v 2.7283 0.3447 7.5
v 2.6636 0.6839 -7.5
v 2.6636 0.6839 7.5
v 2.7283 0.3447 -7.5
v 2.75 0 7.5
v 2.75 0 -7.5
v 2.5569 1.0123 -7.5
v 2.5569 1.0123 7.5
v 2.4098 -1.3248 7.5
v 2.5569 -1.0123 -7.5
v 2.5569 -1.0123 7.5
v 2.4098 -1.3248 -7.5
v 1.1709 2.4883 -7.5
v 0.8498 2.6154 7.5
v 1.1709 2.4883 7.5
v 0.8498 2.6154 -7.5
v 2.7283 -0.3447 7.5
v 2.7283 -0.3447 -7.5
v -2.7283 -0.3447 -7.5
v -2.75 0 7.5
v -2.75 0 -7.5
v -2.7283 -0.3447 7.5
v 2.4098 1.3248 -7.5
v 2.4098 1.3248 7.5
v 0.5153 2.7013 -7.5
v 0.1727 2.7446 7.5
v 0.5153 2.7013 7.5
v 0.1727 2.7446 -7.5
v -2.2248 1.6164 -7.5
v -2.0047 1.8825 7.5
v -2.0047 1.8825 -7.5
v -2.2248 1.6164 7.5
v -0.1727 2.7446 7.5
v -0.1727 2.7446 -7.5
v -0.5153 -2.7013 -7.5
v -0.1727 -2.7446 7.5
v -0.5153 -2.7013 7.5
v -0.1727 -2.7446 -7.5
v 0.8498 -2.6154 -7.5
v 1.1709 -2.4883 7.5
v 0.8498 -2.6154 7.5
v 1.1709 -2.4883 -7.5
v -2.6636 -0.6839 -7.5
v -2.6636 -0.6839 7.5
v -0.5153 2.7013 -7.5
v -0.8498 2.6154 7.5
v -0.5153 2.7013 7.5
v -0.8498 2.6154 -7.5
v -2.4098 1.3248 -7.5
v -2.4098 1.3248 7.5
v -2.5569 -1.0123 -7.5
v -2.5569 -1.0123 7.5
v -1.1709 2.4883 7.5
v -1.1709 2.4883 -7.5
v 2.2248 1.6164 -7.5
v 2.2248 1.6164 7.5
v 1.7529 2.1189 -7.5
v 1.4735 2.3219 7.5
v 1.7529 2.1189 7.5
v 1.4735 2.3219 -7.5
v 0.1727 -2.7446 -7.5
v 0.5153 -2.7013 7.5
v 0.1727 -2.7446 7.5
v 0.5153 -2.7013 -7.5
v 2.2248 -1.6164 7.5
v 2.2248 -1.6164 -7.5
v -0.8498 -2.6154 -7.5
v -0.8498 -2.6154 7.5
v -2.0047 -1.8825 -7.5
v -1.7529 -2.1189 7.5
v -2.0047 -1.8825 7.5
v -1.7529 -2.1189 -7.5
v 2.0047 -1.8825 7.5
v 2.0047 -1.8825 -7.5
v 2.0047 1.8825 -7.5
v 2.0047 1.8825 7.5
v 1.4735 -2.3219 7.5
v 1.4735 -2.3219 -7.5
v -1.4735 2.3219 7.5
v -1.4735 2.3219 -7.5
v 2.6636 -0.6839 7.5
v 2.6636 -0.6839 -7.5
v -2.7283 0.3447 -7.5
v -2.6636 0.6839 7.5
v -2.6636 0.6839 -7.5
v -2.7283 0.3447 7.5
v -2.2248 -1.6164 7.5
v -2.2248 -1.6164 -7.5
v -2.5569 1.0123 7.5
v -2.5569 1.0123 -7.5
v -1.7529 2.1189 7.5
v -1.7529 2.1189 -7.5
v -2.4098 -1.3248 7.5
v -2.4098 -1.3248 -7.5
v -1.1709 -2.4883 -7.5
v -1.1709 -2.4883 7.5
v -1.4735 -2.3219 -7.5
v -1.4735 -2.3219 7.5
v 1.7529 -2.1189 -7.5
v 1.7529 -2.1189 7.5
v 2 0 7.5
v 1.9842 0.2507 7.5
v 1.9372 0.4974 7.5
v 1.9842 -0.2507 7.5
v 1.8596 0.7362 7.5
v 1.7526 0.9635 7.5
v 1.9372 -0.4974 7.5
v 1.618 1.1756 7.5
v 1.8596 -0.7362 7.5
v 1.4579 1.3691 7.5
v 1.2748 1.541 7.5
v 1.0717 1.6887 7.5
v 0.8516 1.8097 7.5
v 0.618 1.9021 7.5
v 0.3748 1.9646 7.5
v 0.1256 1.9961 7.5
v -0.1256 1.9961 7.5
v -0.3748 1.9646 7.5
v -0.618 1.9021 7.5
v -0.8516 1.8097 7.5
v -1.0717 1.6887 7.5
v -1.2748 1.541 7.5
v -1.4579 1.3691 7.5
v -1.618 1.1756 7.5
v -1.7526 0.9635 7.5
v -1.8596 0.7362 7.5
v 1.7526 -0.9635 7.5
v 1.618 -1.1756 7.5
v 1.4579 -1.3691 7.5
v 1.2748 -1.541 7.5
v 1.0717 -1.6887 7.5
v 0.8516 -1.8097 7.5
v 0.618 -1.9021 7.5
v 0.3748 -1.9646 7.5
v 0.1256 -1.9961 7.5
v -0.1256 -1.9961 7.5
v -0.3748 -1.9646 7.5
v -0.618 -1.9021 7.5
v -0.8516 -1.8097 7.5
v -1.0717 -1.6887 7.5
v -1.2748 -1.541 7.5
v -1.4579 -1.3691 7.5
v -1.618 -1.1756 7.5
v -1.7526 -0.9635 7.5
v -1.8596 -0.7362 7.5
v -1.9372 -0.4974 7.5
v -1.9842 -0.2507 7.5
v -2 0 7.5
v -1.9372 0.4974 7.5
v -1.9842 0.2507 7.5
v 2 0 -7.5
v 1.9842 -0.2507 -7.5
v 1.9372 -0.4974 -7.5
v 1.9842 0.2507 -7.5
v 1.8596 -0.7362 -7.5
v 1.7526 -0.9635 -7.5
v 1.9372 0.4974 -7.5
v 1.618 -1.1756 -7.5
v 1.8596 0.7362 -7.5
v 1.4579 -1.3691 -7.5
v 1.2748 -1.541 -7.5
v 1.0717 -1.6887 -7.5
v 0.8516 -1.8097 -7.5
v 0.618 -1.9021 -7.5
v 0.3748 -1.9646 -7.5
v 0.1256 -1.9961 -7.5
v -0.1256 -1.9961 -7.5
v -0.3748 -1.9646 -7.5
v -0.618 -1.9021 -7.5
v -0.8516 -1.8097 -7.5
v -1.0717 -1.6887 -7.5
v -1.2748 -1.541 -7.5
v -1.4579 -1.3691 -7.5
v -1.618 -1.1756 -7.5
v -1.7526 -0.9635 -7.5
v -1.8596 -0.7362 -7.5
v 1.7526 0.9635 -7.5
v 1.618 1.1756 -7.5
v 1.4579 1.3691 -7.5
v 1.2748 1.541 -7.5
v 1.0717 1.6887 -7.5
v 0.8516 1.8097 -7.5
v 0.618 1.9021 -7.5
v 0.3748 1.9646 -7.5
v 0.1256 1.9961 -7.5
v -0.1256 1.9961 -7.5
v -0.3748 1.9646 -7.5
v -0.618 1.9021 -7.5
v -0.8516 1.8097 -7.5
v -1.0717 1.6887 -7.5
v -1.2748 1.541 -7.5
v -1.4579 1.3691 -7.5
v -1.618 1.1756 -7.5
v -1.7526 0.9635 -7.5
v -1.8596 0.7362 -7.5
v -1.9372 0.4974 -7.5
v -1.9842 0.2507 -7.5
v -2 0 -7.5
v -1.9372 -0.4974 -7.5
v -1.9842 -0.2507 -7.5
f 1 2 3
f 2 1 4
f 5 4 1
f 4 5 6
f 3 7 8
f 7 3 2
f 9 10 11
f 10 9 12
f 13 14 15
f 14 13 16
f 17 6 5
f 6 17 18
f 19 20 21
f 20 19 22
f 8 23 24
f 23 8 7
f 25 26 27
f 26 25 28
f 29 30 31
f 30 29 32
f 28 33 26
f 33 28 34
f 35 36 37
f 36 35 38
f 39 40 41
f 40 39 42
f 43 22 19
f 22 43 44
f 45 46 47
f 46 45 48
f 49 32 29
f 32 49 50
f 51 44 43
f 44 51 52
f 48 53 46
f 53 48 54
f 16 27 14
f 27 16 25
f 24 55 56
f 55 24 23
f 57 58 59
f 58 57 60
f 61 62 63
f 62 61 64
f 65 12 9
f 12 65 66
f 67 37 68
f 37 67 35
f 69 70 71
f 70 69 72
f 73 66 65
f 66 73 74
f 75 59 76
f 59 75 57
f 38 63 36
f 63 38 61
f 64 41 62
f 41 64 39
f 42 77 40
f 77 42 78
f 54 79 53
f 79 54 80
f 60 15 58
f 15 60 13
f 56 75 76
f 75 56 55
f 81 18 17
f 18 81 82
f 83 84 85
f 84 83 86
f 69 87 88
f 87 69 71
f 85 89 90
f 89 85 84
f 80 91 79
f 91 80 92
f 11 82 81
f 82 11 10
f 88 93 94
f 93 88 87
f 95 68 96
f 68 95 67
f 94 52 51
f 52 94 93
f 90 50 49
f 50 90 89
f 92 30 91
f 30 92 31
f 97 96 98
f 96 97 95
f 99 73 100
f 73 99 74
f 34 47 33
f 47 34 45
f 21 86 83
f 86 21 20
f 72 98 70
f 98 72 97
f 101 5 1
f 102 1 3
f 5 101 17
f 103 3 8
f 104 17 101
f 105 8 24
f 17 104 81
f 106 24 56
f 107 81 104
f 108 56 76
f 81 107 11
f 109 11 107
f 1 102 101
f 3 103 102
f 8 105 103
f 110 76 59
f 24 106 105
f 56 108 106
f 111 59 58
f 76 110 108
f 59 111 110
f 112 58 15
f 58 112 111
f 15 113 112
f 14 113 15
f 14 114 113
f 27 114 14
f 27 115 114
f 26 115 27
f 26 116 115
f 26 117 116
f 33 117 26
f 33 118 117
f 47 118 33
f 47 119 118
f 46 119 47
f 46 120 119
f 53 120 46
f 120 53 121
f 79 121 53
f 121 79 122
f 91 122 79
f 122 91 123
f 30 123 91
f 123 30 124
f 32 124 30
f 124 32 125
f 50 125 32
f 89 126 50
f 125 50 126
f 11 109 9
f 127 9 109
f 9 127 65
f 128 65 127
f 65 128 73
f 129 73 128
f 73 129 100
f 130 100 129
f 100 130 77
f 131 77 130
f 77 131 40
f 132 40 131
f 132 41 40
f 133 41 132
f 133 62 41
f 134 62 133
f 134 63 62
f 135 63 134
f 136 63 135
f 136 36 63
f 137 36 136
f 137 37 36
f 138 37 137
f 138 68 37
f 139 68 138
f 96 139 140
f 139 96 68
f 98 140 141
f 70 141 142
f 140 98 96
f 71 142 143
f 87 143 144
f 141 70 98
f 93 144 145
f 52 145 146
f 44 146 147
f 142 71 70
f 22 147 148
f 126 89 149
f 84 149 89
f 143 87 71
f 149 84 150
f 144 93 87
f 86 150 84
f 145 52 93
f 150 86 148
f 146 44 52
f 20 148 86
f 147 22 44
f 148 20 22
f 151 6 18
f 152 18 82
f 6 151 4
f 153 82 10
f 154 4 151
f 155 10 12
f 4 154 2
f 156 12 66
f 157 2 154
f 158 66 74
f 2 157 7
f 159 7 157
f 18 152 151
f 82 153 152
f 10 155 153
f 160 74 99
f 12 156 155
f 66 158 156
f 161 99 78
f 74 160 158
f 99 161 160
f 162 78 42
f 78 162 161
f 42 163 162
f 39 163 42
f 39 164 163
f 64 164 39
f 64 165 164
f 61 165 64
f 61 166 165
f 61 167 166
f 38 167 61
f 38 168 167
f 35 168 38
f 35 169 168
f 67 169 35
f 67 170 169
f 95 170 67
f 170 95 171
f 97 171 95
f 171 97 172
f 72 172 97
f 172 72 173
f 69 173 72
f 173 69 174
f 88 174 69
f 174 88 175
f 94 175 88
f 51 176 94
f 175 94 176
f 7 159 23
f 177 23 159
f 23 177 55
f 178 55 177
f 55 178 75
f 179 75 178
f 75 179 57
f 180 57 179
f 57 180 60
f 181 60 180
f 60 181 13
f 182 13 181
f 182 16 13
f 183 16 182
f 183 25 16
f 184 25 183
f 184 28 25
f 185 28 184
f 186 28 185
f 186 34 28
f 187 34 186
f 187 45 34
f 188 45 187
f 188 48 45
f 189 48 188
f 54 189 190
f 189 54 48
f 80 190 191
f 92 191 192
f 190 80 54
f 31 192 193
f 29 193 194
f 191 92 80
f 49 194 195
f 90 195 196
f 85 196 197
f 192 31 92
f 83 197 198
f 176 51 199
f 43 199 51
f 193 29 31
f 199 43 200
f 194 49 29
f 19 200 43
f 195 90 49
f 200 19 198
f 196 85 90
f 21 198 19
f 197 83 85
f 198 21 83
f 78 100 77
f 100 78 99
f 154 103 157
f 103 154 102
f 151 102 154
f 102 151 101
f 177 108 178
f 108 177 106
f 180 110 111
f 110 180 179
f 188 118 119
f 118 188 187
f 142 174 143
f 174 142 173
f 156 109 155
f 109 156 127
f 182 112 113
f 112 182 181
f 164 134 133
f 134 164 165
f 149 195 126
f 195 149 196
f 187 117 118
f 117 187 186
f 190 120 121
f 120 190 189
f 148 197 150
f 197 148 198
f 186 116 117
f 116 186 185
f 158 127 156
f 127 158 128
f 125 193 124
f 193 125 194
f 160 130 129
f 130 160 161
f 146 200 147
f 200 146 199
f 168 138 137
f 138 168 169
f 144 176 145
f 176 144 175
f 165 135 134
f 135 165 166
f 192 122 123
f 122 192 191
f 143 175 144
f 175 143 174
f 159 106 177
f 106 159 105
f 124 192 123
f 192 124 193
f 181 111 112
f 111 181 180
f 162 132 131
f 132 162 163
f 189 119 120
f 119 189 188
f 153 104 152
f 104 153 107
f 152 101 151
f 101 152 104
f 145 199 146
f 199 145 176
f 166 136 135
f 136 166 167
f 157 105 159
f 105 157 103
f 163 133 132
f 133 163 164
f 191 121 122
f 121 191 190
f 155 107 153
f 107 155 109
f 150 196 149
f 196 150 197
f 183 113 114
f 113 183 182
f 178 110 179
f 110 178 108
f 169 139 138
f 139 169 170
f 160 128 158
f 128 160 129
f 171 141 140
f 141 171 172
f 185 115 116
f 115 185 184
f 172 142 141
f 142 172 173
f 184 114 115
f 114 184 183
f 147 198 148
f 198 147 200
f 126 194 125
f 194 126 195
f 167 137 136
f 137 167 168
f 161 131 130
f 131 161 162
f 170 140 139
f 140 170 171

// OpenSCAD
$fn = 50;


difference() {
	union() {
		translate(v = [0, 0, -7.5000000000]) {
			cylinder(h = 15, r = 2.7500000000);
		}
	}
	union() {
		translate(v = [0, 0, -100.0000000000]) {
			cylinder(h = 200, r = 2.0000000000);
		}
	}
}
